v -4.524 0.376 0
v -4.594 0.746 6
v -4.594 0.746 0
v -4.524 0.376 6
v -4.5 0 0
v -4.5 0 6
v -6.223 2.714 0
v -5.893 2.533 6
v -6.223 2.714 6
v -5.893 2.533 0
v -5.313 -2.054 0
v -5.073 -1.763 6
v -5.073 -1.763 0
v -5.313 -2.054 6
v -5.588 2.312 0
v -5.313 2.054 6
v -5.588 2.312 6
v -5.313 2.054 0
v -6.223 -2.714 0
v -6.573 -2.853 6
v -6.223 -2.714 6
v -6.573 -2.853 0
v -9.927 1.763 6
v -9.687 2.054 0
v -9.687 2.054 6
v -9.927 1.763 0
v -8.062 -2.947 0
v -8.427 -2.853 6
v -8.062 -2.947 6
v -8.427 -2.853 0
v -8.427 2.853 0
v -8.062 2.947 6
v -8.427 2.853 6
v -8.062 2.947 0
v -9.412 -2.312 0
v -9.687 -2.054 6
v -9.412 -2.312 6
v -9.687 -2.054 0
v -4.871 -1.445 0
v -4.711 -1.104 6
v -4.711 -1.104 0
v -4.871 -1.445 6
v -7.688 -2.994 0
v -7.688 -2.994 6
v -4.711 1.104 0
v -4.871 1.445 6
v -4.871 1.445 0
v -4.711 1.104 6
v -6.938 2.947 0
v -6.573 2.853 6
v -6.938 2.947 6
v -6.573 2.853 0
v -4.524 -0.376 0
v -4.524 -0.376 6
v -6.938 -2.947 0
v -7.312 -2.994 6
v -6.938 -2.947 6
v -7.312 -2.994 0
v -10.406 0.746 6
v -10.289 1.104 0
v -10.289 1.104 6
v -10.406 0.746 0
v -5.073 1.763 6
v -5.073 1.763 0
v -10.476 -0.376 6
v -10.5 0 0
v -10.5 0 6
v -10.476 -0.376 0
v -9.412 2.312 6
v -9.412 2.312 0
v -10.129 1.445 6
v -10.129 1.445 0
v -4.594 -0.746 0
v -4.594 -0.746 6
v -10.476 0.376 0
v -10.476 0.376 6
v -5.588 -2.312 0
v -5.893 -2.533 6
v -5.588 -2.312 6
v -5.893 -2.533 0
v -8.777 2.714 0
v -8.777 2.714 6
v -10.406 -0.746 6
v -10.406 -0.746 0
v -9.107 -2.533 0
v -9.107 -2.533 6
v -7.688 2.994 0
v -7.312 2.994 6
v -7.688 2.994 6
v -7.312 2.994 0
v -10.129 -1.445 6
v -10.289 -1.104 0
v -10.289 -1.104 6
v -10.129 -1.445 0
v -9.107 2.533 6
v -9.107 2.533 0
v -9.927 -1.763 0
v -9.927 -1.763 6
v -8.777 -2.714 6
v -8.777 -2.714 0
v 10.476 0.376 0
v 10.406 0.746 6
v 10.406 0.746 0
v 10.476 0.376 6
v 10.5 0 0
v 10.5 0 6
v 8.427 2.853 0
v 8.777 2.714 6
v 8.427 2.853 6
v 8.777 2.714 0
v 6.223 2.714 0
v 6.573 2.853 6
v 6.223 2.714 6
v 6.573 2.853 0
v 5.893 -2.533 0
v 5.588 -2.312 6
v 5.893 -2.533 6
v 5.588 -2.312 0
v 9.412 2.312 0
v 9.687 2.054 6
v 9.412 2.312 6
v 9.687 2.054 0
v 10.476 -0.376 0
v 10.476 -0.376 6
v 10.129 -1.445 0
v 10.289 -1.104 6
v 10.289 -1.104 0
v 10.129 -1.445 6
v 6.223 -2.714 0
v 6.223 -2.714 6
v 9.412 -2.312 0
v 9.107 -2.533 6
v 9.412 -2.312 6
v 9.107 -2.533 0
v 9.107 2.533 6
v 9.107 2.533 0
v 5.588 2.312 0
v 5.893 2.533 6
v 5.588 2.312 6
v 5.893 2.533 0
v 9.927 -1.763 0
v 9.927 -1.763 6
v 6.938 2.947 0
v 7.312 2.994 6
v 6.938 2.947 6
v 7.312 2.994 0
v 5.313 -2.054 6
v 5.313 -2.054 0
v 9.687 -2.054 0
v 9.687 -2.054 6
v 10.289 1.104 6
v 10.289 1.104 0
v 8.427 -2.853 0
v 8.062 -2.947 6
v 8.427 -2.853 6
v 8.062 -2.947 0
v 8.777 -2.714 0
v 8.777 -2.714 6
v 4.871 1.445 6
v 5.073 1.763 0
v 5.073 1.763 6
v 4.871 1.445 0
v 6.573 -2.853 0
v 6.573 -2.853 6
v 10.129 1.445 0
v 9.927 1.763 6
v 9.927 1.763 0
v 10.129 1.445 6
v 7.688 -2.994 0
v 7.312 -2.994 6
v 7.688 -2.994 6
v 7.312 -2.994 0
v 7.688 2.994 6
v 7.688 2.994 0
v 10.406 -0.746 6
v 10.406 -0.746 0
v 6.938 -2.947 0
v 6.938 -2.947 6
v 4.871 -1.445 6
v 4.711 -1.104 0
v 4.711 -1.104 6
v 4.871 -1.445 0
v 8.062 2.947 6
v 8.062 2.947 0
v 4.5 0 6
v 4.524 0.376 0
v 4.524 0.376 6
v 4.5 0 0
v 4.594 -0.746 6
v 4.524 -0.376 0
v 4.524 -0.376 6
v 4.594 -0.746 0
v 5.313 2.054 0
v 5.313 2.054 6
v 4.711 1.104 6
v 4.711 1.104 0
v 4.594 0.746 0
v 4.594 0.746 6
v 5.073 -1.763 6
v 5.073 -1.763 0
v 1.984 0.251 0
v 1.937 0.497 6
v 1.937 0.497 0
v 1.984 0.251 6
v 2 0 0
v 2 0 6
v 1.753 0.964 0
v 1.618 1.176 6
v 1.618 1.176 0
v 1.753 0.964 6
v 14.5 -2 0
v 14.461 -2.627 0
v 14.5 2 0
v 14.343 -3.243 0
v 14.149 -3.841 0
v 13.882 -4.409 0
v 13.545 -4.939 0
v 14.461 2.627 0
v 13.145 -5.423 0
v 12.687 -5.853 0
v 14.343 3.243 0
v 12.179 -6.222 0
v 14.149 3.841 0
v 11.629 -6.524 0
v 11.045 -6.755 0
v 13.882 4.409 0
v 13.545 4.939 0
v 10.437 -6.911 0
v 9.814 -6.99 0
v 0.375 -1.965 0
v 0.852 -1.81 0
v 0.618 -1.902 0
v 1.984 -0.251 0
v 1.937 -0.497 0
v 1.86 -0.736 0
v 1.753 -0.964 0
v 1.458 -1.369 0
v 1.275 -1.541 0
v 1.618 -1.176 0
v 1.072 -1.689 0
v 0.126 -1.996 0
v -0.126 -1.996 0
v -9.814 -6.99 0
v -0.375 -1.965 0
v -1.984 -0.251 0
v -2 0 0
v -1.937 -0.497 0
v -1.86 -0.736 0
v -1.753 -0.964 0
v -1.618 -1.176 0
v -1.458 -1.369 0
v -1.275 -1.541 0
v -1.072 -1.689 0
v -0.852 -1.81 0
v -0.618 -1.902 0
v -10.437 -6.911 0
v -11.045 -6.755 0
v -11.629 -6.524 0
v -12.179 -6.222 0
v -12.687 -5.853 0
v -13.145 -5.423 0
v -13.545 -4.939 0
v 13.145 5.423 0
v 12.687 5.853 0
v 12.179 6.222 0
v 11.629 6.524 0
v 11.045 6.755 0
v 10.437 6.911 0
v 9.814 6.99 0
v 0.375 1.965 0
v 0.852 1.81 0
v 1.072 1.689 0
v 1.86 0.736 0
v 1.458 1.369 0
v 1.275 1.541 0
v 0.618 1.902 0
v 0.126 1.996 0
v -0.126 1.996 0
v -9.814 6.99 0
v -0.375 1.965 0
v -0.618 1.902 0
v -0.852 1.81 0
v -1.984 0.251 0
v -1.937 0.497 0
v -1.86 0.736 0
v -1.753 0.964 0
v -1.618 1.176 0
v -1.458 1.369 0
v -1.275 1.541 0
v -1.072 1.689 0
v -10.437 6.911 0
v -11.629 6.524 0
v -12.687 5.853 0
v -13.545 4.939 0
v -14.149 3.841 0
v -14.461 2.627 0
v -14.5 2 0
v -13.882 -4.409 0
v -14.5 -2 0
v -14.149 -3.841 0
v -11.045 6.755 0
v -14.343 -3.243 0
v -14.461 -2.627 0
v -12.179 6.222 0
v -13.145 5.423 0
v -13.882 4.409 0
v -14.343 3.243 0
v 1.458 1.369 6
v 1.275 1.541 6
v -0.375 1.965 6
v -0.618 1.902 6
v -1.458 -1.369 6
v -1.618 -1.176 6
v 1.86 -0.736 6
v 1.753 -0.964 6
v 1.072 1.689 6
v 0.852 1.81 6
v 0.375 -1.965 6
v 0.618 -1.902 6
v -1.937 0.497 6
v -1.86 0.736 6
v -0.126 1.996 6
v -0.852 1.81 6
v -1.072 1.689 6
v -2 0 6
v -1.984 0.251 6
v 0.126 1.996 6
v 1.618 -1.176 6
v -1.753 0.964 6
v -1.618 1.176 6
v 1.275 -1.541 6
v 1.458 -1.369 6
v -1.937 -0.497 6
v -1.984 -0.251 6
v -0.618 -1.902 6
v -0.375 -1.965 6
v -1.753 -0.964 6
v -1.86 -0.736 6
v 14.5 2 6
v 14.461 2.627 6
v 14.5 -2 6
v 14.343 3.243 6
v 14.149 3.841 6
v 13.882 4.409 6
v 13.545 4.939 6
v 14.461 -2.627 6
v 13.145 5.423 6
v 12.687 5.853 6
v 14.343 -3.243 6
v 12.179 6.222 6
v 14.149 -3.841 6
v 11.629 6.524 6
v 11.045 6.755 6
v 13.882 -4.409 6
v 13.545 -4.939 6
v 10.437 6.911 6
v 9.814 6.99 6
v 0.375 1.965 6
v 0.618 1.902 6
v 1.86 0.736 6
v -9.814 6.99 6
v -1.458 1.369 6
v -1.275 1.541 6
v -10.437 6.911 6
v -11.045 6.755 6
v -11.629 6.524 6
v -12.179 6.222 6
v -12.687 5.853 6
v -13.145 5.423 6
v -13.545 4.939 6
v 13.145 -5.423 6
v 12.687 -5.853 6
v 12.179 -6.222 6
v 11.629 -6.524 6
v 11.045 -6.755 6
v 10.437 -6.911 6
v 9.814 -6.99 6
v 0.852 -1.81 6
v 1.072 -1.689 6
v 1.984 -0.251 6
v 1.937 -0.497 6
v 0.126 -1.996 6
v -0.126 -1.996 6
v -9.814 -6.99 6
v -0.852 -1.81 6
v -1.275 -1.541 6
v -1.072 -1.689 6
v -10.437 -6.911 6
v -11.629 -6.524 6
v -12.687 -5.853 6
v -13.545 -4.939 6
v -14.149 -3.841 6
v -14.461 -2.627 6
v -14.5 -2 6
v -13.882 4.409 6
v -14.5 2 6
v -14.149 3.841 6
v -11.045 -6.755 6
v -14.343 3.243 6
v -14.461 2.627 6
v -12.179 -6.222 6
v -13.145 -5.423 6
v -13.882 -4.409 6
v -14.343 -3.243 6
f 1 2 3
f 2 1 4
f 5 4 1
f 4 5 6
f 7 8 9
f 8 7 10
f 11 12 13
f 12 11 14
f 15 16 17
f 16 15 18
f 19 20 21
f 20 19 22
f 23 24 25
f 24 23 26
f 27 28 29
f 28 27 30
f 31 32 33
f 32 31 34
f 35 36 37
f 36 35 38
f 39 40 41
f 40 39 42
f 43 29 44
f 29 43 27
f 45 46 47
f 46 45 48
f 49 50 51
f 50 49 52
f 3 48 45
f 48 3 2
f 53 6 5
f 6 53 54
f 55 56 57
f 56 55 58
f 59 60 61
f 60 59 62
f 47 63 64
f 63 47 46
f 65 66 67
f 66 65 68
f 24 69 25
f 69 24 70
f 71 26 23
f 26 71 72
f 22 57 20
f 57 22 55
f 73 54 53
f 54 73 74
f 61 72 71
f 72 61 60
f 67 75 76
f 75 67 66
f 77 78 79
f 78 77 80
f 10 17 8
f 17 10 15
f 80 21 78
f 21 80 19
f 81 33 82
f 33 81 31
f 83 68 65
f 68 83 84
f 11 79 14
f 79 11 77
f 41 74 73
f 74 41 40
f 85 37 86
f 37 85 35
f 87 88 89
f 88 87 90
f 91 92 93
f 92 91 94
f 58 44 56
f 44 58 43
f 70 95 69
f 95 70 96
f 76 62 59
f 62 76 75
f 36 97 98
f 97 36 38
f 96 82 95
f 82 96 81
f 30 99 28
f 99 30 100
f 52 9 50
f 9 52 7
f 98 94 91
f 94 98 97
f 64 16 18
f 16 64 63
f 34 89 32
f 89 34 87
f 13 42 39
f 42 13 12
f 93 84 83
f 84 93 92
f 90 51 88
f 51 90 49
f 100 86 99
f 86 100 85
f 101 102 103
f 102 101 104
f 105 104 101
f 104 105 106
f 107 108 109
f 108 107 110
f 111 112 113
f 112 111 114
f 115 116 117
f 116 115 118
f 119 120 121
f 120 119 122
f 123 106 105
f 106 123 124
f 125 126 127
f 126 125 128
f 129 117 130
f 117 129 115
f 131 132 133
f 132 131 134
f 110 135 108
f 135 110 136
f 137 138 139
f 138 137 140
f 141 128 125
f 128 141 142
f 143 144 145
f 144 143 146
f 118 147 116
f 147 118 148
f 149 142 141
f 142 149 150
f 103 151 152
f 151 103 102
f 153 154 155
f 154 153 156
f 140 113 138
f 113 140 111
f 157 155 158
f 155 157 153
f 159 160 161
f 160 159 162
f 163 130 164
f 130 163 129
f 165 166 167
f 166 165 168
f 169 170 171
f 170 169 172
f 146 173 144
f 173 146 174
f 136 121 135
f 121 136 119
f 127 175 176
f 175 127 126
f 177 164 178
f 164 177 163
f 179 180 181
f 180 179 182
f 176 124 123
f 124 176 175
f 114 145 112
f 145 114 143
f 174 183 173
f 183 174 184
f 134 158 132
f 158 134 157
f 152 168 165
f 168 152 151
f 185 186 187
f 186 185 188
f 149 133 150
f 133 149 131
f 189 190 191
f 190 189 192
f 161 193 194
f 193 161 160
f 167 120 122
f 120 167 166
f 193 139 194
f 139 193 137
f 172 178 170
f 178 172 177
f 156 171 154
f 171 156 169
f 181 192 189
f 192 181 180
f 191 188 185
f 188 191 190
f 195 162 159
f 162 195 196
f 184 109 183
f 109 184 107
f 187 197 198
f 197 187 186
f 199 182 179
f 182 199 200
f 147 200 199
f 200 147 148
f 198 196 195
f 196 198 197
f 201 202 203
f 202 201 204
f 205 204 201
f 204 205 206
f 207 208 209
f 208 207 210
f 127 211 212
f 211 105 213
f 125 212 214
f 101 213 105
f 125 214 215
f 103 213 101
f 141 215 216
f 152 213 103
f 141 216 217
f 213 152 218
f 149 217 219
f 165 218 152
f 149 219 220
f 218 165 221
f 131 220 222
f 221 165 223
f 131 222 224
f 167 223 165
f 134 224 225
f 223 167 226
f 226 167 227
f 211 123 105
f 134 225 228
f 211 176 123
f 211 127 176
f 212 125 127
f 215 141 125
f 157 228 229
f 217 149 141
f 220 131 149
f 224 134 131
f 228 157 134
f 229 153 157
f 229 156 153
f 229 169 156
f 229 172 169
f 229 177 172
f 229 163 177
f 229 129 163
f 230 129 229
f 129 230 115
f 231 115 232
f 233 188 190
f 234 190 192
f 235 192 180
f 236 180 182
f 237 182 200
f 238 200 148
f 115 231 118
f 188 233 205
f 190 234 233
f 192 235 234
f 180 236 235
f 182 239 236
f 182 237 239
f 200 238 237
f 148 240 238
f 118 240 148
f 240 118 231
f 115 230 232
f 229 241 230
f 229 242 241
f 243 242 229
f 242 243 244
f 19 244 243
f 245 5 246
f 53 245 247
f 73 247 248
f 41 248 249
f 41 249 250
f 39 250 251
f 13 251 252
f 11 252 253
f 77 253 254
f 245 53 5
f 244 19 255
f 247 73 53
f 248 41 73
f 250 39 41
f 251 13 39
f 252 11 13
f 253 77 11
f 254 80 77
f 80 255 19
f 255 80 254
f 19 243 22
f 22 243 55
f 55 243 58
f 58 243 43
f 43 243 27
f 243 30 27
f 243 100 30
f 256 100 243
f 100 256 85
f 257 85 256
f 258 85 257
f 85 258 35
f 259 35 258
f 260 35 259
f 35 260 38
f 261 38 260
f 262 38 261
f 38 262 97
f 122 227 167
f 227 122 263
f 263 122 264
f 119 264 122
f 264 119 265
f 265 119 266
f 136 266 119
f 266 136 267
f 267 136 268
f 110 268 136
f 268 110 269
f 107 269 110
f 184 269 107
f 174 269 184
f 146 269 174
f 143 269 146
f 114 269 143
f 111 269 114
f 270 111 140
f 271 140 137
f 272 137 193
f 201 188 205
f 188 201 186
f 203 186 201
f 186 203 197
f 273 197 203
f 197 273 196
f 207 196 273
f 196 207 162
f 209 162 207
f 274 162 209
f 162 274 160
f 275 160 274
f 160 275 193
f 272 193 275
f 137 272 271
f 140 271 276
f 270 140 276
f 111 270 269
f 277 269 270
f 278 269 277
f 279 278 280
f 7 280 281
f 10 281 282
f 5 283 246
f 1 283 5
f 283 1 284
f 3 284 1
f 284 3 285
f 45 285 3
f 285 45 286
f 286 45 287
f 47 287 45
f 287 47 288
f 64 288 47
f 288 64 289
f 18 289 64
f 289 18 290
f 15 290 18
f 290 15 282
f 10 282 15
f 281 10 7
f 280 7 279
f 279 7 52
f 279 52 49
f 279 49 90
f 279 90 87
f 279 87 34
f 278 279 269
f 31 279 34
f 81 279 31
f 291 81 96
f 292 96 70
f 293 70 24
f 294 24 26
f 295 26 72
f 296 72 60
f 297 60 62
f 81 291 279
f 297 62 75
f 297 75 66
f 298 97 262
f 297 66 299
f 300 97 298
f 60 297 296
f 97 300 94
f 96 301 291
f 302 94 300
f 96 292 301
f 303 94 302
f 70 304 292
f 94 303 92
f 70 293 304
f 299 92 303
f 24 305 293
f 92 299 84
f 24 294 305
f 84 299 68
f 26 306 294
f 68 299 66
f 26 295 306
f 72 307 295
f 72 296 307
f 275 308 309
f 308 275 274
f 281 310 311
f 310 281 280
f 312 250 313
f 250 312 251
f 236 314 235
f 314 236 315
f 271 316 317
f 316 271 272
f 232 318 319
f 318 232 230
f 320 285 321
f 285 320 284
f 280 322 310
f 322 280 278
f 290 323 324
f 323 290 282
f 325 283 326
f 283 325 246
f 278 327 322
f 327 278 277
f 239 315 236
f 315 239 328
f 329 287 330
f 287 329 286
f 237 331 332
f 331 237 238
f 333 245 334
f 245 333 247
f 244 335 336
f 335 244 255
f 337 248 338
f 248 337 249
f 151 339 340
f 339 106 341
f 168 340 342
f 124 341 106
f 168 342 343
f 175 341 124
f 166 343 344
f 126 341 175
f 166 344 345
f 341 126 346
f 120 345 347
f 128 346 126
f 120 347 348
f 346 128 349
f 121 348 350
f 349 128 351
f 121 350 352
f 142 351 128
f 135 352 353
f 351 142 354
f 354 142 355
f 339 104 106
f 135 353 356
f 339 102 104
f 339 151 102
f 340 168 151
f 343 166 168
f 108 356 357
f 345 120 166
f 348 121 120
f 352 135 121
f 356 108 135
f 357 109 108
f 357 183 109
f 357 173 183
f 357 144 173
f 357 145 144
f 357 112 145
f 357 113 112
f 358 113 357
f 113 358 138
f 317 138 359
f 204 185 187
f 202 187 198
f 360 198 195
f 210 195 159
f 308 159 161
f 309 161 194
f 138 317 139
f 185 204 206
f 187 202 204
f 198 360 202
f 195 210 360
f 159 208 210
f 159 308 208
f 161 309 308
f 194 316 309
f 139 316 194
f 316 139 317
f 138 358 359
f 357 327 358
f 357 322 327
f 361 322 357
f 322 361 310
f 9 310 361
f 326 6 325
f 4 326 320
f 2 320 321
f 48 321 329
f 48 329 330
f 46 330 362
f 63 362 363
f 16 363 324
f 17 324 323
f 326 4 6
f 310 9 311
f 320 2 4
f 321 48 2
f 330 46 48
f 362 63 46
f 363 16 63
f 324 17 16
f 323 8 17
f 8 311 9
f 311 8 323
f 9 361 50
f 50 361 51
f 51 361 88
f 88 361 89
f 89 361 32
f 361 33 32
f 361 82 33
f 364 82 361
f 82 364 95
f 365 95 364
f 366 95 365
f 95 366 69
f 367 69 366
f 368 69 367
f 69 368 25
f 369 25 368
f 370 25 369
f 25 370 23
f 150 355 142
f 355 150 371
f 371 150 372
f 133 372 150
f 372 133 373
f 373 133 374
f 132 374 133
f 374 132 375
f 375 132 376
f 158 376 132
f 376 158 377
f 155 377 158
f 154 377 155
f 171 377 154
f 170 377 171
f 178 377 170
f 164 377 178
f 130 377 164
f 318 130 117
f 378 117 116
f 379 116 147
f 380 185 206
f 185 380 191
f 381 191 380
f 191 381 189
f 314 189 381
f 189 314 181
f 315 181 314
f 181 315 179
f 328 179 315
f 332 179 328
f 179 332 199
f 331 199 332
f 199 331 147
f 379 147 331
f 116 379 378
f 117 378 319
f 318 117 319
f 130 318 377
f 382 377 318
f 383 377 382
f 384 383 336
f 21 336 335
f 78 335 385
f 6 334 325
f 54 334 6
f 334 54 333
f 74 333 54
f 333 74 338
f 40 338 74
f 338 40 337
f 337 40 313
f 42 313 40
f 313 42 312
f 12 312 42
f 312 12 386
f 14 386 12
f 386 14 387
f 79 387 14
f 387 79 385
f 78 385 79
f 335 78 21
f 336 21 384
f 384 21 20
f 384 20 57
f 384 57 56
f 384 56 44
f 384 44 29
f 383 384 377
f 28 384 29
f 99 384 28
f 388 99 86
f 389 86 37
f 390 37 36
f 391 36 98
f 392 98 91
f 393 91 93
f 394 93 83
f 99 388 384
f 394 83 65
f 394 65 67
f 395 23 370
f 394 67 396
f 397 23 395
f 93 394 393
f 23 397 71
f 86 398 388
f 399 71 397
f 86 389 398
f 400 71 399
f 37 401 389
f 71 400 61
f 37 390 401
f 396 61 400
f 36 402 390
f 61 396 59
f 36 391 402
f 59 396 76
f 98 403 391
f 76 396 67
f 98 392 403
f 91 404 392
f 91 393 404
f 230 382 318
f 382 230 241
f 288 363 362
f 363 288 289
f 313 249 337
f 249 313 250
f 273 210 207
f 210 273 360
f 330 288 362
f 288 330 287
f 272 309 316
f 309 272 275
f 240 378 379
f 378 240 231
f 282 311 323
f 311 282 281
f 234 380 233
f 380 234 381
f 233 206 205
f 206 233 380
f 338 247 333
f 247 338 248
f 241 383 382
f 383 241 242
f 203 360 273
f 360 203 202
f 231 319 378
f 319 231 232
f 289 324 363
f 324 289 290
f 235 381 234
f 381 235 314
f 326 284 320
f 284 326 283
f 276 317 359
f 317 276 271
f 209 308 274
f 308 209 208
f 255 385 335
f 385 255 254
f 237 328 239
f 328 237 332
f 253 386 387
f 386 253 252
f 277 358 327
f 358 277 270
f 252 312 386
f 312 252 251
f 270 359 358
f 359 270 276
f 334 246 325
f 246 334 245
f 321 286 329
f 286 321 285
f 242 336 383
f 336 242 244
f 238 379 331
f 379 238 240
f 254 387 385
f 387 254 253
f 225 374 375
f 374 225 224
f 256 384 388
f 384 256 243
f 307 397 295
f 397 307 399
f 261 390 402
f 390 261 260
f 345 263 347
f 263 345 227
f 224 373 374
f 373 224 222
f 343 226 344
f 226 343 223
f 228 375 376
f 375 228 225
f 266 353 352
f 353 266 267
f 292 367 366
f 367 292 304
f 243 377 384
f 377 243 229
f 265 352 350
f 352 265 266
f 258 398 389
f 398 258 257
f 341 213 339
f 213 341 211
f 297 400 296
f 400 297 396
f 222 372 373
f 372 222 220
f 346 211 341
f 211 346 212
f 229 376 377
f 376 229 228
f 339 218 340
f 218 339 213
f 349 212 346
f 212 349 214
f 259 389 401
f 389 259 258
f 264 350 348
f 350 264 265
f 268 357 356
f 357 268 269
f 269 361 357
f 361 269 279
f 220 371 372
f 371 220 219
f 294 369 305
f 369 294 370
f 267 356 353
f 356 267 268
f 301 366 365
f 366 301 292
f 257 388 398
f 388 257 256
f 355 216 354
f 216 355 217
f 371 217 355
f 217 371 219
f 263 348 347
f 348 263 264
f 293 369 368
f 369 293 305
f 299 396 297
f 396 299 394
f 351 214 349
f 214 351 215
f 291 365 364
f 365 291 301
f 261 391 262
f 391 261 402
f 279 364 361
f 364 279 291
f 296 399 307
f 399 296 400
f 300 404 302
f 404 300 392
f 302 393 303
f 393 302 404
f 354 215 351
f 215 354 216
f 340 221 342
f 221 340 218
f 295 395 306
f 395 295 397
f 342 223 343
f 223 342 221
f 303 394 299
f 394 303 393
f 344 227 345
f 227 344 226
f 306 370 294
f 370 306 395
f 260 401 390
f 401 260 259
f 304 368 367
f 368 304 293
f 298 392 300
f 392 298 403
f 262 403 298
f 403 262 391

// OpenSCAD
$fn = 50;


difference() {
	union() {
		hull() {
			translate(v = [-9.5000000000, 2.0000000000, 0]) {
				cylinder(h = 6, r = 5);
			}
			translate(v = [9.5000000000, 2.0000000000, 0]) {
				cylinder(h = 6, r = 5);
			}
			translate(v = [-9.5000000000, -2.0000000000, 0]) {
				cylinder(h = 6, r = 5);
			}
			translate(v = [9.5000000000, -2.0000000000, 0]) {
				cylinder(h = 6, r = 5);
			}
		}
	}
	union() {
		#translate(v = [-7.5000000000, 0.0000000000, 0]) {
			cylinder(h = 6, r = 3.0000000000);
		}
		#translate(v = [7.5000000000, 0.0000000000, 0]) {
			cylinder(h = 6, r = 3.0000000000);
		}
		#translate(v = [-7.5000000000, 0.0000000000, -100.0000000000]) {
			cylinder(h = 200, r = 3.0000000000);
		}
		#translate(v = [-7.5000000000, 0.0000000000, -100.0000000000]) {
			cylinder(h = 200, r = 3.0000000000);
		}
		#translate(v = [7.5000000000, 0.0000000000, -100.0000000000]) {
			cylinder(h = 200, r = 3.0000000000);
		}
		#translate(v = [7.5000000000, 0.0000000000, -100.0000000000]) {
			cylinder(h = 200, r = 3.0000000000);
		}
		#translate(v = [-7.5000000000, 0.0000000000, 0]) {
			cylinder(h = 6, r = 1.5000000000);
		}
		#translate(v = [7.5000000000, 0.0000000000, 0]) {
			cylinder(h = 6, r = 1.5000000000);
		}
		#translate(v = [-7.5000000000, 0.0000000000, 0]) {
			cylinder(h = 6, r = 1.5000000000);
		}
		#translate(v = [7.5000000000, 0.0000000000, 0]) {
			cylinder(h = 6, r = 1.5000000000);
		}
		#translate(v = [-7.5000000000, 0.0000000000, 0]) {
			cylinder(h = 6, r = 1.5000000000);
		}
		#translate(v = [7.5000000000, 0.0000000000, 0]) {
			cylinder(h = 6, r = 1.5000000000);
		}
		#cylinder(h = 6, r = 2.0000000000);
	}
}
